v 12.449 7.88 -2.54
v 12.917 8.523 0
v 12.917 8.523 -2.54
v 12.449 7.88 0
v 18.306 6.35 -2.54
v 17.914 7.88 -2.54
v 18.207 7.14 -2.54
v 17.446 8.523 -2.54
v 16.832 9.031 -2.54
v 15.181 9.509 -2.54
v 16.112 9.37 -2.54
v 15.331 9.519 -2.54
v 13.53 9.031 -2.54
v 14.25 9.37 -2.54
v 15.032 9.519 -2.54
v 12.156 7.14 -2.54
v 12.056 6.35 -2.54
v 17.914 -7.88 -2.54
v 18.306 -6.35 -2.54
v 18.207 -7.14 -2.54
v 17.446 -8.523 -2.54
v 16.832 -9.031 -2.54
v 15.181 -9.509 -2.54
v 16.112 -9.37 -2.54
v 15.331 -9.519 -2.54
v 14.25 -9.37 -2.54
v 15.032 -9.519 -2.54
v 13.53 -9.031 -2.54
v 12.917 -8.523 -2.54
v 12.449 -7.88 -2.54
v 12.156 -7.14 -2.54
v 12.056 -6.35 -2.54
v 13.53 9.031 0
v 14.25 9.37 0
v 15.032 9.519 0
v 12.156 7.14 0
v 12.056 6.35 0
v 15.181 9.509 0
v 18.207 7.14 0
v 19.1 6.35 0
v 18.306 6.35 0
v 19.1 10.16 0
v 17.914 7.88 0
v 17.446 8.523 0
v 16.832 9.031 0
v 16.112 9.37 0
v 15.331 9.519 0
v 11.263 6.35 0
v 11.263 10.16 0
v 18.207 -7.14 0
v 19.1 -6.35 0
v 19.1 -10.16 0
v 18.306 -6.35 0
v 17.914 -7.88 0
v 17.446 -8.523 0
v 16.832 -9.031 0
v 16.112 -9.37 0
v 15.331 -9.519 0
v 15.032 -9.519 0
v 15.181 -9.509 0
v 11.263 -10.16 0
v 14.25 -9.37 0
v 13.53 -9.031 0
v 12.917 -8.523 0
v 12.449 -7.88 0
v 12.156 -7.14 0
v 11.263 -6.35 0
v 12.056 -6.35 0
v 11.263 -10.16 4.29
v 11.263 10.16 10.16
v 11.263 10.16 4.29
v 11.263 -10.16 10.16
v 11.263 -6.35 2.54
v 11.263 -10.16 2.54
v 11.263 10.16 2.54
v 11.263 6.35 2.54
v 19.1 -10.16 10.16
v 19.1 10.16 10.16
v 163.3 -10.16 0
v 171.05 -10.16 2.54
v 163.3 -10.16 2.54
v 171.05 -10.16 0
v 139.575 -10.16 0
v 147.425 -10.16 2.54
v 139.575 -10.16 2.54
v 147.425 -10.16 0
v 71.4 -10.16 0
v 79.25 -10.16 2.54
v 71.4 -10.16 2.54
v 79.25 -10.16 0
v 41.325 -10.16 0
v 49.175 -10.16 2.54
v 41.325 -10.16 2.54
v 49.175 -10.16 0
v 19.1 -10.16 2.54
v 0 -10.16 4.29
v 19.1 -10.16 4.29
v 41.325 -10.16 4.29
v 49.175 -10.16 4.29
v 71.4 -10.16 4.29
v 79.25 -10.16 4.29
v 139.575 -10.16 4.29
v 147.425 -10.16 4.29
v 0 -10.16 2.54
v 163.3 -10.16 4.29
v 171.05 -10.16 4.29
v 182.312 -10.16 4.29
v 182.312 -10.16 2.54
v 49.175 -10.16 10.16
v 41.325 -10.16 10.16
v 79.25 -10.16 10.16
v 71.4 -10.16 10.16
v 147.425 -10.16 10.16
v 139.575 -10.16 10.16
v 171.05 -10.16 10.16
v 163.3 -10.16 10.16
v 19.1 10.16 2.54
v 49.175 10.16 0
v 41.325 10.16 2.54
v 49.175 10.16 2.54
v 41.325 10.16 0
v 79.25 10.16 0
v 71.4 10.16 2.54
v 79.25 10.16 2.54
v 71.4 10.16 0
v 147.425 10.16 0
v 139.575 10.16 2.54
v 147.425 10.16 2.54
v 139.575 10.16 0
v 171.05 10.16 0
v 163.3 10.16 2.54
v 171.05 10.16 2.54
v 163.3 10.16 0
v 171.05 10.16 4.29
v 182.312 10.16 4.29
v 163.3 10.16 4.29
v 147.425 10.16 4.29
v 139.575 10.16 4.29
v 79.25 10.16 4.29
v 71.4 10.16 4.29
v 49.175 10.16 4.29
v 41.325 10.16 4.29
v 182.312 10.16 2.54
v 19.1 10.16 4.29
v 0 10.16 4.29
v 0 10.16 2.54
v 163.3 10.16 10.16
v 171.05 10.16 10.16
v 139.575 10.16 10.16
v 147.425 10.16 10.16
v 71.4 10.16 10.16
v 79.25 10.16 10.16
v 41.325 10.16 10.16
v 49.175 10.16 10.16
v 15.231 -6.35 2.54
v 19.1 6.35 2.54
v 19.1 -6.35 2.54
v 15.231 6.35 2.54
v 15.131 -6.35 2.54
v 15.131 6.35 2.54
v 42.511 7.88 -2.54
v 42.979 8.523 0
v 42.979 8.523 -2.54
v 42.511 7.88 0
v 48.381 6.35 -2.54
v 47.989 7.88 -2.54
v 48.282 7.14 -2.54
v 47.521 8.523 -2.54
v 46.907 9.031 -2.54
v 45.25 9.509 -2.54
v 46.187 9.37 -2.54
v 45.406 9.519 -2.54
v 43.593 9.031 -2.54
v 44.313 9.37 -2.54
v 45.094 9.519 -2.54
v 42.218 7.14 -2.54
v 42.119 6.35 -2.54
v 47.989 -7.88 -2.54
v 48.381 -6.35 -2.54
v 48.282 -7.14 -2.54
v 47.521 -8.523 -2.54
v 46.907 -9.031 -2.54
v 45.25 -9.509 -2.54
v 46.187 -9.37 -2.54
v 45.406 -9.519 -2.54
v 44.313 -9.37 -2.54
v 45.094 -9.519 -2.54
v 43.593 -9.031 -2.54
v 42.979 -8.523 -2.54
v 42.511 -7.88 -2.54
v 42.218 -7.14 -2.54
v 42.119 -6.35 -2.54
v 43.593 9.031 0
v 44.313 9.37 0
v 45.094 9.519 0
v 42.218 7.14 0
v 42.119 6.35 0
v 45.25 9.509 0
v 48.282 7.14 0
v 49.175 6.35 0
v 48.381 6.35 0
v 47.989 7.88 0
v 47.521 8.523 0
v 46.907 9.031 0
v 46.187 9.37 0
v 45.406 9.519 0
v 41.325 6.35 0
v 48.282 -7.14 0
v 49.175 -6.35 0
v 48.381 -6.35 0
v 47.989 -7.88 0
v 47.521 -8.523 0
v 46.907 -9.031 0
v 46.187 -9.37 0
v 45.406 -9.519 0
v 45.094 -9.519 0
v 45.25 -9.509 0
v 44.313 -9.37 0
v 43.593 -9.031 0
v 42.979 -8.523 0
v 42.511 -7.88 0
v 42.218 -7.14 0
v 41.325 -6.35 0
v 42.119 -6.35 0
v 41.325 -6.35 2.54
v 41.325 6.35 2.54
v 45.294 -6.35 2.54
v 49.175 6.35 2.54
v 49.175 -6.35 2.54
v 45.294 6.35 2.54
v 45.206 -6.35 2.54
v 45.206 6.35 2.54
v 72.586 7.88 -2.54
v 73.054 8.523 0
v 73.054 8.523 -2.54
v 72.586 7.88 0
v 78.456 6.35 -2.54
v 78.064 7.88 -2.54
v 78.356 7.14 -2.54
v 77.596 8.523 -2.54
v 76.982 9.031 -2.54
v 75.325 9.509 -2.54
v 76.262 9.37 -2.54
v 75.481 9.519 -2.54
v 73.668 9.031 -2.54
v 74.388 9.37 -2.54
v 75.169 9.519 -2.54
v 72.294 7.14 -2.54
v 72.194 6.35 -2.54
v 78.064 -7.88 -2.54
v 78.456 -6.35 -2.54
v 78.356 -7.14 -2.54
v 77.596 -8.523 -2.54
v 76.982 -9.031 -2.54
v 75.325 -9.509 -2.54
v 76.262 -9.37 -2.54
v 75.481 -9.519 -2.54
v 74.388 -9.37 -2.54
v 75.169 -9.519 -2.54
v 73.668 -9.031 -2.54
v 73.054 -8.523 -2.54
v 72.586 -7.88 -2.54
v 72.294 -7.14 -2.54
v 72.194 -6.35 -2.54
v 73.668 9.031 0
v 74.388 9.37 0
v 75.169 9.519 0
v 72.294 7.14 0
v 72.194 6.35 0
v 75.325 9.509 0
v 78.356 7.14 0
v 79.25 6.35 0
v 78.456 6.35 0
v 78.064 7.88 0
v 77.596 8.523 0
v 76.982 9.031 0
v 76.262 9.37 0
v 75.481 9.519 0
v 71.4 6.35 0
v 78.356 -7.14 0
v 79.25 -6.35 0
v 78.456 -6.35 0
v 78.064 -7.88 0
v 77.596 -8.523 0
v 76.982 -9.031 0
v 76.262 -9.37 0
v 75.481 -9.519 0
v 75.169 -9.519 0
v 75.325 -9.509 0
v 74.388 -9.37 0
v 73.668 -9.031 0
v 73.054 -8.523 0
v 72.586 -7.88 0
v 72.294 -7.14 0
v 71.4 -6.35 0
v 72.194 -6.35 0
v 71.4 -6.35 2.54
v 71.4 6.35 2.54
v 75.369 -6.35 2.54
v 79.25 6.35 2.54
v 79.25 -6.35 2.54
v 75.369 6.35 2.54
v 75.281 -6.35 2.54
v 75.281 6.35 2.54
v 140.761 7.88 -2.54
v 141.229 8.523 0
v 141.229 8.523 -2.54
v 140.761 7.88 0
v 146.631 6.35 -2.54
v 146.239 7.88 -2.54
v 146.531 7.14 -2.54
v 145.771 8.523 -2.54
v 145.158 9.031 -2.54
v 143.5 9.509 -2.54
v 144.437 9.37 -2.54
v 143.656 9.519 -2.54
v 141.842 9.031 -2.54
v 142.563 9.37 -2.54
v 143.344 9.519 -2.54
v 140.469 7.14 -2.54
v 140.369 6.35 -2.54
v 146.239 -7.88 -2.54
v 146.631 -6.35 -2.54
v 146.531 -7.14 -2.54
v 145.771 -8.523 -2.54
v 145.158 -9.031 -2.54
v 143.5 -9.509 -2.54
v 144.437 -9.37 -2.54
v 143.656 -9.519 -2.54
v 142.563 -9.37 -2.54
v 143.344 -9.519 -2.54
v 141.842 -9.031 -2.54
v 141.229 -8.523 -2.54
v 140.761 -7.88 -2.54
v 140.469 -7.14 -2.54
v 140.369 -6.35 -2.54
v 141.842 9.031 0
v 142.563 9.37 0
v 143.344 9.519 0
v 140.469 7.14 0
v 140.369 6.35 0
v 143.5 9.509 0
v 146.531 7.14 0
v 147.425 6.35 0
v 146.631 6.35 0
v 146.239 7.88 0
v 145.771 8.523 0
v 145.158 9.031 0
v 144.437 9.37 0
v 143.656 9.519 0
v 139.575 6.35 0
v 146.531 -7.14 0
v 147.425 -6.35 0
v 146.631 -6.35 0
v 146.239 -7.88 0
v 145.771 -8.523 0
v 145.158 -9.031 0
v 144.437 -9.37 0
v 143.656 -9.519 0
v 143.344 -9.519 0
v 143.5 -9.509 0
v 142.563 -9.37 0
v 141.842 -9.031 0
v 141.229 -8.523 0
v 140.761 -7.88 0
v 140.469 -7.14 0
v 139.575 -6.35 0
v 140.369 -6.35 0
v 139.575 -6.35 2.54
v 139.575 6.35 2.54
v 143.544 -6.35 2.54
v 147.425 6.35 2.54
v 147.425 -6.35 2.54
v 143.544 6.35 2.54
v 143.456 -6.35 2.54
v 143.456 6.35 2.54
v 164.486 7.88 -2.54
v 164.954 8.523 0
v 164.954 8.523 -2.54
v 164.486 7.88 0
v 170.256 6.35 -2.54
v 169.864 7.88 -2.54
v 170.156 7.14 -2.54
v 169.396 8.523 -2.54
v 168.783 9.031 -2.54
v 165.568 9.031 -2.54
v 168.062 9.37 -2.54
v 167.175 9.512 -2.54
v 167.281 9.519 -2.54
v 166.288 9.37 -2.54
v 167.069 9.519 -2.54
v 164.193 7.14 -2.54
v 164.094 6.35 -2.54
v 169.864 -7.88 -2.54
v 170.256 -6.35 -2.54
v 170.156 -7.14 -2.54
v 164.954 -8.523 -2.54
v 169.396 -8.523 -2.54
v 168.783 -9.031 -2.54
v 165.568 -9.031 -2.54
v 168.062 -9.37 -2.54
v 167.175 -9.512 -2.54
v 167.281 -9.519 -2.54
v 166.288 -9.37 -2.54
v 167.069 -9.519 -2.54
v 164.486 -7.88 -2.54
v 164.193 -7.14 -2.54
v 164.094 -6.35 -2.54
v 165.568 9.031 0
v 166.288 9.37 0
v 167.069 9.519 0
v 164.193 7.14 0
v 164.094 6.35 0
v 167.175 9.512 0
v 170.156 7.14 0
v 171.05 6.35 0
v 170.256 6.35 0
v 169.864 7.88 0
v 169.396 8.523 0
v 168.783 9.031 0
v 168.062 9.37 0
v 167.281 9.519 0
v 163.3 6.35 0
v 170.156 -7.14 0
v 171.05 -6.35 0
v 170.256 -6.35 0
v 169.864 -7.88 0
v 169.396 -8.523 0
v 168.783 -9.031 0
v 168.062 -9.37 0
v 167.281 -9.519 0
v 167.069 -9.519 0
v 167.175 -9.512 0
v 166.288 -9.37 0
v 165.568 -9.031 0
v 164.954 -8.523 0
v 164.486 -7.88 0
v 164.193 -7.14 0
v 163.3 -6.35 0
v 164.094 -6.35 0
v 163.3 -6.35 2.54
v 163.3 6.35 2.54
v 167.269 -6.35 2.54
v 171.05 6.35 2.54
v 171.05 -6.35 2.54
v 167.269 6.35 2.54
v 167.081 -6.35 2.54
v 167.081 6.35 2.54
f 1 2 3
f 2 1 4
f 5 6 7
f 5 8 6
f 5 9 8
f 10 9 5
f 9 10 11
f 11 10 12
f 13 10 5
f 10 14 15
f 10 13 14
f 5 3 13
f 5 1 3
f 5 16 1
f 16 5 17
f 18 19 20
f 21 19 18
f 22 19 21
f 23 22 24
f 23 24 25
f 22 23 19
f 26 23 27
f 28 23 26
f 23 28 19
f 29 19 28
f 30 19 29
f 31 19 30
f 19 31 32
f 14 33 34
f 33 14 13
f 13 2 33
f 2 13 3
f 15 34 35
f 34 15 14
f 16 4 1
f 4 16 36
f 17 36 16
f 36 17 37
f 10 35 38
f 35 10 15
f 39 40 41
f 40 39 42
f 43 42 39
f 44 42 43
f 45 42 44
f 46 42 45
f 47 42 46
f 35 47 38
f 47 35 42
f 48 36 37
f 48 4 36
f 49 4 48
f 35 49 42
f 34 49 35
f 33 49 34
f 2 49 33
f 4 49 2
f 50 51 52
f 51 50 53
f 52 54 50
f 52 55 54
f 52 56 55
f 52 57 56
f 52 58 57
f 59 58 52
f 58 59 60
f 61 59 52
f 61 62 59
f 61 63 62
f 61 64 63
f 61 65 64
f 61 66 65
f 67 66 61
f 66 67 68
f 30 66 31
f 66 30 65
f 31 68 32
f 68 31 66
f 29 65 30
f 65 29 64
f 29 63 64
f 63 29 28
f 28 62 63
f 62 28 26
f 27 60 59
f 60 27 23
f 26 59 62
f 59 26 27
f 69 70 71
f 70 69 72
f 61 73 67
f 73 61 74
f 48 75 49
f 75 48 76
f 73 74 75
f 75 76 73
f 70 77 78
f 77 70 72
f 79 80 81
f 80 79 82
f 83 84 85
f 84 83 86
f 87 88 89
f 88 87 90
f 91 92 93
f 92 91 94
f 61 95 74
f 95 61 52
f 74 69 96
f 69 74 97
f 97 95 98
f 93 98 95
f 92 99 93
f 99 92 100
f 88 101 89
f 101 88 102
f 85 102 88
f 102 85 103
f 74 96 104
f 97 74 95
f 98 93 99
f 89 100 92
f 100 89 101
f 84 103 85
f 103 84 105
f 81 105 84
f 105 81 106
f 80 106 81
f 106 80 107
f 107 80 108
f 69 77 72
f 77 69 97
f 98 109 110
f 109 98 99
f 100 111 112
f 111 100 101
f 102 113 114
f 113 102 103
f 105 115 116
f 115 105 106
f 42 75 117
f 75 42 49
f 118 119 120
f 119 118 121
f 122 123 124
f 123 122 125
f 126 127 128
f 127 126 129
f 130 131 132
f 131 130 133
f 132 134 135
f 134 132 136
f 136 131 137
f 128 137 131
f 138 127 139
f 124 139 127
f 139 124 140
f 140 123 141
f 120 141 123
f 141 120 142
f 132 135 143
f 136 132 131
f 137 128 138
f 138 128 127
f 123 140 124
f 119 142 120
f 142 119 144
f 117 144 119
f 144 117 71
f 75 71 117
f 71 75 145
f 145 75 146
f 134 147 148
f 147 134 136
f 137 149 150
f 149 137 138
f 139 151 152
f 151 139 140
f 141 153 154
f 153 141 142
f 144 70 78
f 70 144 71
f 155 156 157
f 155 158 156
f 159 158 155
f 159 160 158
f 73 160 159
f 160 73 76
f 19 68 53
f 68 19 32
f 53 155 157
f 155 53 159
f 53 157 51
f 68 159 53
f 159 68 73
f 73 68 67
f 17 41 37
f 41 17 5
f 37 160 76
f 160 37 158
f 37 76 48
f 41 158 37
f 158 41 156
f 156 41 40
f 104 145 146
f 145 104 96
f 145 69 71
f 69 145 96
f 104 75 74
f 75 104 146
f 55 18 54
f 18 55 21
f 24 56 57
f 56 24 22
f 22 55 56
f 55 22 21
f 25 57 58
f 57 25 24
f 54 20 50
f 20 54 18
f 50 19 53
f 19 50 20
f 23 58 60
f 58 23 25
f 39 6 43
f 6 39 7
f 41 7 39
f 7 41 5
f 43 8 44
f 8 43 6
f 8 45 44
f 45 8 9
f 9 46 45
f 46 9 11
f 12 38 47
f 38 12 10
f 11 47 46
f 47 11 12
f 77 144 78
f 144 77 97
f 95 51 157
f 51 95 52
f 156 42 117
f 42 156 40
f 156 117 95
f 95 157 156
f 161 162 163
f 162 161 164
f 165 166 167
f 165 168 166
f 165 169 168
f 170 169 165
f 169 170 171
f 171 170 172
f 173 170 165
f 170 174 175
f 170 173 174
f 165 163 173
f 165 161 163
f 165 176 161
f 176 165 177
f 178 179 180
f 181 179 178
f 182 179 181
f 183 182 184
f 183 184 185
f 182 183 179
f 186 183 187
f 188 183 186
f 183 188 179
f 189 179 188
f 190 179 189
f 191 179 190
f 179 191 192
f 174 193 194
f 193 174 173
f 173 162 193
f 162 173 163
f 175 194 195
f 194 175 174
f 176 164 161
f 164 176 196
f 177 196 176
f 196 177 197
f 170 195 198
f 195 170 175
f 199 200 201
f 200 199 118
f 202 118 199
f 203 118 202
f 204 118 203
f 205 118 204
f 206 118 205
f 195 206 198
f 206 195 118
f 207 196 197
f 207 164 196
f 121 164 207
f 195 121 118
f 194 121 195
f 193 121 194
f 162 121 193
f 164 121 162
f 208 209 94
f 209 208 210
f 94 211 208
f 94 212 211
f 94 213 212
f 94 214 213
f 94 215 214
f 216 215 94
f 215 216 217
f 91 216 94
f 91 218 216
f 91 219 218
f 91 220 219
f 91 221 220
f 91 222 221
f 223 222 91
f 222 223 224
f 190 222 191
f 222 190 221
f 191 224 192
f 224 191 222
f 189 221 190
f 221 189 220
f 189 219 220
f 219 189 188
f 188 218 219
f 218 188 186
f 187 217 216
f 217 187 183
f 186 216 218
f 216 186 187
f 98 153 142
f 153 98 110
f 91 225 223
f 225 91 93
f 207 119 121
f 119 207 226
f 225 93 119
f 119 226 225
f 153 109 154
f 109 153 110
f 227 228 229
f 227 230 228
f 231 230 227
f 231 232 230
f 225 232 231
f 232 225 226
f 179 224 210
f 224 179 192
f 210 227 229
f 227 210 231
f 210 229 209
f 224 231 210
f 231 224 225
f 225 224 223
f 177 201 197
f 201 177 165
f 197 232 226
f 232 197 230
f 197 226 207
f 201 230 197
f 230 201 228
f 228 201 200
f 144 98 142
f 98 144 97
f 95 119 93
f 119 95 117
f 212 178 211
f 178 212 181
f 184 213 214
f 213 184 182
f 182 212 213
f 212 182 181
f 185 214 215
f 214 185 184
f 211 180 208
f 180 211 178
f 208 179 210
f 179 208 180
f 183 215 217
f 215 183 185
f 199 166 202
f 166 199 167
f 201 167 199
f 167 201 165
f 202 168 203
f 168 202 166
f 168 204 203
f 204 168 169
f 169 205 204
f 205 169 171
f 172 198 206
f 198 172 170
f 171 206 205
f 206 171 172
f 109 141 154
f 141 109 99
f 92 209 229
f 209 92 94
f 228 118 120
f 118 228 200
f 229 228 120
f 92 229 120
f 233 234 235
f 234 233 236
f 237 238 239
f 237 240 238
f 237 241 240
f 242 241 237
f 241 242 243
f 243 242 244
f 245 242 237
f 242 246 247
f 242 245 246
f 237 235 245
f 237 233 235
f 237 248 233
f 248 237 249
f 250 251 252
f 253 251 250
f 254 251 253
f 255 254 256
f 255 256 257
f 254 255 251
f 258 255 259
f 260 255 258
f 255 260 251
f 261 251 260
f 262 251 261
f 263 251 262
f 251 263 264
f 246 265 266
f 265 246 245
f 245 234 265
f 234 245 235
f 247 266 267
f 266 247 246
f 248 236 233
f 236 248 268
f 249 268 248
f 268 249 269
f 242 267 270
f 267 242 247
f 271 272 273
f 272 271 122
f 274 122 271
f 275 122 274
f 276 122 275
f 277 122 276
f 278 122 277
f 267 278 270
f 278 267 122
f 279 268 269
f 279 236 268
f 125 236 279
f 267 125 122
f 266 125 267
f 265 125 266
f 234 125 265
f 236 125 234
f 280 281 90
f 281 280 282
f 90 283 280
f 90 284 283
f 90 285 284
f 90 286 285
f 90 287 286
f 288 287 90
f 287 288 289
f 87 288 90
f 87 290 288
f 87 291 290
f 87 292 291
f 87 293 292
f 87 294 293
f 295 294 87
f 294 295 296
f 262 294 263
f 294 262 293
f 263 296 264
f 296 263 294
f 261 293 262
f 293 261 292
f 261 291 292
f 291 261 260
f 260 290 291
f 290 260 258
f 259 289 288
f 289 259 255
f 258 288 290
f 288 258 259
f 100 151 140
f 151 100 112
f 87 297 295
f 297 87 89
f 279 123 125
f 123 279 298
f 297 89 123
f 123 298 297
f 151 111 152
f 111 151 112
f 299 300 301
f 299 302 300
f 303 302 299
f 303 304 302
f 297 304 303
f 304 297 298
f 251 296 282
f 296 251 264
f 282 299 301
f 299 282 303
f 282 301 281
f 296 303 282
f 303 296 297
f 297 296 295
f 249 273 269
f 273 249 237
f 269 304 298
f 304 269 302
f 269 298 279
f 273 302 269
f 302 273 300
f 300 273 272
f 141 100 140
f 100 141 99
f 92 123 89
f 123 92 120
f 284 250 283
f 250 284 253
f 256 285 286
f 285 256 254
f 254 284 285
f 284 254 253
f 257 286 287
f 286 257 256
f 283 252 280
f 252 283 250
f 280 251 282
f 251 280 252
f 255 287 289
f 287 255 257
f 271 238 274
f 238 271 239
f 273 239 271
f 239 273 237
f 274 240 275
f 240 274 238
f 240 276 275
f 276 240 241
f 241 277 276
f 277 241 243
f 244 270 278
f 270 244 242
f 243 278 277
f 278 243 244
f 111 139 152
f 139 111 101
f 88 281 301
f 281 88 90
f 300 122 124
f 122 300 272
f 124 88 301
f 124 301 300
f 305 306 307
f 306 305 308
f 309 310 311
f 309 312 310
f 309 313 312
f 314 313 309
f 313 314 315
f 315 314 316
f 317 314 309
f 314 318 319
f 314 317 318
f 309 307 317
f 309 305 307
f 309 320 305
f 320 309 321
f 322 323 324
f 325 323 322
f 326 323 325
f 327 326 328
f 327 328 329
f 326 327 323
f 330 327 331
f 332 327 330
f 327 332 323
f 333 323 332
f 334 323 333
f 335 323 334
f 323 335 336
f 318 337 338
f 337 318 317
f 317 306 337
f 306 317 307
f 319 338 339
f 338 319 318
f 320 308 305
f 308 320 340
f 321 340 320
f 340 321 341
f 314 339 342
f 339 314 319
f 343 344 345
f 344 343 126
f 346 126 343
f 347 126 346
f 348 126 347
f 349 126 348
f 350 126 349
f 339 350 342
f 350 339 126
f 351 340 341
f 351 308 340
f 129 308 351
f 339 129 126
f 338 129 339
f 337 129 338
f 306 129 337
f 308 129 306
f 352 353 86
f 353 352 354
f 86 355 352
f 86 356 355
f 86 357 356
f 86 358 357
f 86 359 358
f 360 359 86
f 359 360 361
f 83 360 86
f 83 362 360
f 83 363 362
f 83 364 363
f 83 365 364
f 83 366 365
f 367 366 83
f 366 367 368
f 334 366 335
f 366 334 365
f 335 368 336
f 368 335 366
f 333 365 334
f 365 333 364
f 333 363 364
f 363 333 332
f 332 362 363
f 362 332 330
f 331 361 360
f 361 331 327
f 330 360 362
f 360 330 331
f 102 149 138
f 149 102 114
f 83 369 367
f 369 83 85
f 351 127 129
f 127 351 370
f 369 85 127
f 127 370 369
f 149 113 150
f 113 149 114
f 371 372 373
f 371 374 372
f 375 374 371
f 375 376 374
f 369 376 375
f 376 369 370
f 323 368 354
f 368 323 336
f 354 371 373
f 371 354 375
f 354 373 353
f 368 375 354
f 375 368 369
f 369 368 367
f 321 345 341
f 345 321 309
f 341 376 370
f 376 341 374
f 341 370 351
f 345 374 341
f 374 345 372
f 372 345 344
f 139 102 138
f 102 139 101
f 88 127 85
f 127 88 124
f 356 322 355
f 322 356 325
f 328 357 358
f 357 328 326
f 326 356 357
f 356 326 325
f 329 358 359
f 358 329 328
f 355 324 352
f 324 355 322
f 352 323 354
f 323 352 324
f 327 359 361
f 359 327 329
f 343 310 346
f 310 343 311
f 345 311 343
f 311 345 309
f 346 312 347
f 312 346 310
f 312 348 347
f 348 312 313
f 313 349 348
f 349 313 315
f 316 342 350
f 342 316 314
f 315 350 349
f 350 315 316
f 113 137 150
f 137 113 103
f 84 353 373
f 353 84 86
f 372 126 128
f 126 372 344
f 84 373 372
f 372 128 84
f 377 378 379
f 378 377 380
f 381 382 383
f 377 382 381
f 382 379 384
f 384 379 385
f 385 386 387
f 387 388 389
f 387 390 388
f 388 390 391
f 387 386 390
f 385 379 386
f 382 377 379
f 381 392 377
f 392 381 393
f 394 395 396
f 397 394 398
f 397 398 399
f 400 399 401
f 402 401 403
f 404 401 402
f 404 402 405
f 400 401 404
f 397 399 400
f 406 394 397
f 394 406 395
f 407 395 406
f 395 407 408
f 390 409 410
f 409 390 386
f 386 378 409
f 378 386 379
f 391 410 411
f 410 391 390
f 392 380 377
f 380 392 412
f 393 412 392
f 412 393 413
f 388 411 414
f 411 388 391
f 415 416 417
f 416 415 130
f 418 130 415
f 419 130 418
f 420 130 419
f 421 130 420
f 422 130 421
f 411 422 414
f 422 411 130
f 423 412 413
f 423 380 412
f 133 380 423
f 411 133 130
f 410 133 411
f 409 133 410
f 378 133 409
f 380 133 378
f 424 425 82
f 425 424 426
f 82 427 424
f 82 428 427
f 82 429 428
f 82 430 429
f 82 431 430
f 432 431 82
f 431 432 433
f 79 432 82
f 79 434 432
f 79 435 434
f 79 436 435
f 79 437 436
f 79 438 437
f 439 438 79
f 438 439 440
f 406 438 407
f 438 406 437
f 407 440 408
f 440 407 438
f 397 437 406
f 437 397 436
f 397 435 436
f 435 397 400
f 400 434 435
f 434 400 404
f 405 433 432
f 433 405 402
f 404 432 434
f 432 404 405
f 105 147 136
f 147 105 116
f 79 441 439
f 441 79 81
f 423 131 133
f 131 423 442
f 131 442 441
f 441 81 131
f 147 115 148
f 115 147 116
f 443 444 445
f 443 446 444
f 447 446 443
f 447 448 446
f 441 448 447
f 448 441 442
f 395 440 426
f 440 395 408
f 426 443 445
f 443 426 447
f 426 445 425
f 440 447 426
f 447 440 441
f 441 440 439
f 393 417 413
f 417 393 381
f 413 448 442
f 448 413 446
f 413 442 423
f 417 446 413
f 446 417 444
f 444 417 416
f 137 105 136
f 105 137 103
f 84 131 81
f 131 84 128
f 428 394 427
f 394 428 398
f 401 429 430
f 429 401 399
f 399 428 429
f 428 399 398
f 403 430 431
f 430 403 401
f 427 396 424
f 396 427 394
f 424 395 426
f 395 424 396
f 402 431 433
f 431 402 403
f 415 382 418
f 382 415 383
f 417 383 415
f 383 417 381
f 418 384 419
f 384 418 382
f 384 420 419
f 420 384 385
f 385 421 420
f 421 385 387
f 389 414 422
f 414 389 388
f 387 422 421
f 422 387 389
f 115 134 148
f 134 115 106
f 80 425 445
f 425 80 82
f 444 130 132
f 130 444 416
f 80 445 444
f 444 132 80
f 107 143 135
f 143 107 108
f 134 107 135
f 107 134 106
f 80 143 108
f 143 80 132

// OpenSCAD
use <write.scad>;

//Convert inches to mm
function mm(in) = in * 25.4;

board_thickness    = 1.75;     //thickness of circuit board
width              = mm(.8);   //width of whole module (y)
leg_support_height = mm(.1);   //height of square leg part
depth              = mm(3/16); //depth of plastic end (x)
height             = mm(.5);   //height of whole module (z)
wire_depth         = 13;       //depth of entire wire module (x)


//Generate one magnetic end, translated so that the feet sink below
// the x/y plane
module mag_end(tab=false)
{
	leg_rad            = mm(1/8);  //radius of leg
	leg_height         = mm(.1);   //height of round leg part
	leg_support_height = mm(.1);   //height of square leg part
	space_between_legs = mm(.5);   //space between legs
	tab_depth          = 2;            //depth of mating tab (x)
	tab_width          = mm(1/8);  //width of mating tab (y)
	tab_height         = mm(.05);  //height of mating tab (z)

	translate([-depth/2, 0, -leg_height])
	{
		difference()
		{
			union()
			{
				//leg 1
				translate([0, -(space_between_legs/2), 0])
					cylinder(r=leg_rad, h=leg_height, $fn=25);
				//leg 2
				translate([0, (space_between_legs/2), 0])
					cylinder(r=leg_rad, h=leg_height, $fn=25);
				//leg support
				translate([leg_rad/2, 0, (height - leg_height)/2 + leg_support_height])
					cube([depth, width, height - leg_height], center=true);
			}

			//Take out the hole for the matching tab
			if(tab)
				translate([tab_depth/2, -tab_width/2, tab_height/2 + leg_height + leg_support_height + board_thickness])
					cube([tab_depth, tab_width, tab_height], center=true);

			//Take off half of legs in plane of magnets
			translate([-depth/2, 0, 0])
				cube([depth, width, height*4], center=true);

			//Take off other quarter of legs, and interior of plastic part, in
			// direction of board
			translate([0, 0, (leg_height + leg_support_height)/2])
				cube([depth*2, space_between_legs, leg_height + leg_support_height], center=true);
		}

		//tab
		if(tab)
			translate([-tab_depth/2, tab_width/2, tab_height/2 + leg_height + leg_support_height + board_thickness])
				cube([tab_depth, tab_width, tab_height], center=true);
	}
}

//Generate a little bits module n holes long (legs count as half holes;
// e.g., the standard module such as the i3 button is 4 holes long).
module _lb_module(name="x00", length=4, tabs=false)
{
	translate([(length * mm(.25))/2 + depth/2, 0, 0])
	difference()
	{
		union()
		{
			translate([-(length * mm(.25))/2, 0, 0])
				mag_end(tabs);
			translate([(length * mm(.25))/2, 0, 0])
				rotate(180)
					mag_end(tabs);
			translate([0, 0, leg_support_height + board_thickness/2])
				cube([length * mm(.25), width, board_thickness], center=true);
		}
		translate([0, 0, leg_support_height + board_thickness])
			write(name, font="letters.dxf", center=true, t=board_thickness/2, h=5);
	}
}


module _wire(tabs=false)
{
	length = 2;
	union()
	{
		translate([-(length * mm(.25))/2, 0, 0])
			mag_end(tabs);
		//board
		translate([0, 0, leg_support_height + board_thickness/2])
			cube([wire_depth, width, board_thickness], center=true);
	}
}

module wire_out(tabs=false)
{
	translate([wire_depth/2 + depth/2 - .25, 0, 0])
		difference()
		{
			_wire(tabs);
			translate([0, 0, leg_support_height + board_thickness])
				write("w1", font="letters.dxf", center=true, t=board_thickness/2, h=5);
		}
}


module wire_in(tabs=false)
{
	translate([wire_depth/2, 0, 0])
		difference()
		{
			rotate(180)
				_wire(tabs);
			translate([0, 0, leg_support_height + board_thickness])
				write("w1", font="letters.dxf", center=true, t=board_thickness/2, h=5);
		}
	if($children)
		translate([wire_depth + depth/2 - .25, 0, 0])
			children(0);
}

wire_in()
lb_module(i3)
lb_module(i20)
lb_module(w20)
lb_module(i7)
wire_out()
;

//Extract properties from the module list at bottom
function lb_mod_name(mod_type) = mod_type[0];
function lb_mod_size(mod_type) = mod_type[1];

module lb_module(mod_type, tabs=false)
{
	name = lb_mod_name(mod_type);
	size = lb_mod_size(mod_type);
	_lb_module(name, size, tabs);
	if($children)
		translate([(size + .5) * mm(.25) + 1.5, 0, 0])
			children(0);
}

//Modules that I know or can guess the size for
i2  = ["i2",   4];  //i2 toggle switch
i3  = ["i3",   4];  //i3 button
i7  = ["i7",   3];  //i7 remote trigger
i17 = ["i17",  4];  //i17 timeout
i20 = ["i20",  4];  //i20 sound trigger
i34 = ["i34",  4];  //i34 random
w20 = ["w20", 10];  //w20 cloud
o3  = ["o3",   4];  //o3 rgb led


/*
wire_in()
lb_module(i2)
lb_module(i3)
lb_module(i7)
lb_module(i3)
lb_module(i17)
lb_module(w20)
lb_module(i3)
;
*/
